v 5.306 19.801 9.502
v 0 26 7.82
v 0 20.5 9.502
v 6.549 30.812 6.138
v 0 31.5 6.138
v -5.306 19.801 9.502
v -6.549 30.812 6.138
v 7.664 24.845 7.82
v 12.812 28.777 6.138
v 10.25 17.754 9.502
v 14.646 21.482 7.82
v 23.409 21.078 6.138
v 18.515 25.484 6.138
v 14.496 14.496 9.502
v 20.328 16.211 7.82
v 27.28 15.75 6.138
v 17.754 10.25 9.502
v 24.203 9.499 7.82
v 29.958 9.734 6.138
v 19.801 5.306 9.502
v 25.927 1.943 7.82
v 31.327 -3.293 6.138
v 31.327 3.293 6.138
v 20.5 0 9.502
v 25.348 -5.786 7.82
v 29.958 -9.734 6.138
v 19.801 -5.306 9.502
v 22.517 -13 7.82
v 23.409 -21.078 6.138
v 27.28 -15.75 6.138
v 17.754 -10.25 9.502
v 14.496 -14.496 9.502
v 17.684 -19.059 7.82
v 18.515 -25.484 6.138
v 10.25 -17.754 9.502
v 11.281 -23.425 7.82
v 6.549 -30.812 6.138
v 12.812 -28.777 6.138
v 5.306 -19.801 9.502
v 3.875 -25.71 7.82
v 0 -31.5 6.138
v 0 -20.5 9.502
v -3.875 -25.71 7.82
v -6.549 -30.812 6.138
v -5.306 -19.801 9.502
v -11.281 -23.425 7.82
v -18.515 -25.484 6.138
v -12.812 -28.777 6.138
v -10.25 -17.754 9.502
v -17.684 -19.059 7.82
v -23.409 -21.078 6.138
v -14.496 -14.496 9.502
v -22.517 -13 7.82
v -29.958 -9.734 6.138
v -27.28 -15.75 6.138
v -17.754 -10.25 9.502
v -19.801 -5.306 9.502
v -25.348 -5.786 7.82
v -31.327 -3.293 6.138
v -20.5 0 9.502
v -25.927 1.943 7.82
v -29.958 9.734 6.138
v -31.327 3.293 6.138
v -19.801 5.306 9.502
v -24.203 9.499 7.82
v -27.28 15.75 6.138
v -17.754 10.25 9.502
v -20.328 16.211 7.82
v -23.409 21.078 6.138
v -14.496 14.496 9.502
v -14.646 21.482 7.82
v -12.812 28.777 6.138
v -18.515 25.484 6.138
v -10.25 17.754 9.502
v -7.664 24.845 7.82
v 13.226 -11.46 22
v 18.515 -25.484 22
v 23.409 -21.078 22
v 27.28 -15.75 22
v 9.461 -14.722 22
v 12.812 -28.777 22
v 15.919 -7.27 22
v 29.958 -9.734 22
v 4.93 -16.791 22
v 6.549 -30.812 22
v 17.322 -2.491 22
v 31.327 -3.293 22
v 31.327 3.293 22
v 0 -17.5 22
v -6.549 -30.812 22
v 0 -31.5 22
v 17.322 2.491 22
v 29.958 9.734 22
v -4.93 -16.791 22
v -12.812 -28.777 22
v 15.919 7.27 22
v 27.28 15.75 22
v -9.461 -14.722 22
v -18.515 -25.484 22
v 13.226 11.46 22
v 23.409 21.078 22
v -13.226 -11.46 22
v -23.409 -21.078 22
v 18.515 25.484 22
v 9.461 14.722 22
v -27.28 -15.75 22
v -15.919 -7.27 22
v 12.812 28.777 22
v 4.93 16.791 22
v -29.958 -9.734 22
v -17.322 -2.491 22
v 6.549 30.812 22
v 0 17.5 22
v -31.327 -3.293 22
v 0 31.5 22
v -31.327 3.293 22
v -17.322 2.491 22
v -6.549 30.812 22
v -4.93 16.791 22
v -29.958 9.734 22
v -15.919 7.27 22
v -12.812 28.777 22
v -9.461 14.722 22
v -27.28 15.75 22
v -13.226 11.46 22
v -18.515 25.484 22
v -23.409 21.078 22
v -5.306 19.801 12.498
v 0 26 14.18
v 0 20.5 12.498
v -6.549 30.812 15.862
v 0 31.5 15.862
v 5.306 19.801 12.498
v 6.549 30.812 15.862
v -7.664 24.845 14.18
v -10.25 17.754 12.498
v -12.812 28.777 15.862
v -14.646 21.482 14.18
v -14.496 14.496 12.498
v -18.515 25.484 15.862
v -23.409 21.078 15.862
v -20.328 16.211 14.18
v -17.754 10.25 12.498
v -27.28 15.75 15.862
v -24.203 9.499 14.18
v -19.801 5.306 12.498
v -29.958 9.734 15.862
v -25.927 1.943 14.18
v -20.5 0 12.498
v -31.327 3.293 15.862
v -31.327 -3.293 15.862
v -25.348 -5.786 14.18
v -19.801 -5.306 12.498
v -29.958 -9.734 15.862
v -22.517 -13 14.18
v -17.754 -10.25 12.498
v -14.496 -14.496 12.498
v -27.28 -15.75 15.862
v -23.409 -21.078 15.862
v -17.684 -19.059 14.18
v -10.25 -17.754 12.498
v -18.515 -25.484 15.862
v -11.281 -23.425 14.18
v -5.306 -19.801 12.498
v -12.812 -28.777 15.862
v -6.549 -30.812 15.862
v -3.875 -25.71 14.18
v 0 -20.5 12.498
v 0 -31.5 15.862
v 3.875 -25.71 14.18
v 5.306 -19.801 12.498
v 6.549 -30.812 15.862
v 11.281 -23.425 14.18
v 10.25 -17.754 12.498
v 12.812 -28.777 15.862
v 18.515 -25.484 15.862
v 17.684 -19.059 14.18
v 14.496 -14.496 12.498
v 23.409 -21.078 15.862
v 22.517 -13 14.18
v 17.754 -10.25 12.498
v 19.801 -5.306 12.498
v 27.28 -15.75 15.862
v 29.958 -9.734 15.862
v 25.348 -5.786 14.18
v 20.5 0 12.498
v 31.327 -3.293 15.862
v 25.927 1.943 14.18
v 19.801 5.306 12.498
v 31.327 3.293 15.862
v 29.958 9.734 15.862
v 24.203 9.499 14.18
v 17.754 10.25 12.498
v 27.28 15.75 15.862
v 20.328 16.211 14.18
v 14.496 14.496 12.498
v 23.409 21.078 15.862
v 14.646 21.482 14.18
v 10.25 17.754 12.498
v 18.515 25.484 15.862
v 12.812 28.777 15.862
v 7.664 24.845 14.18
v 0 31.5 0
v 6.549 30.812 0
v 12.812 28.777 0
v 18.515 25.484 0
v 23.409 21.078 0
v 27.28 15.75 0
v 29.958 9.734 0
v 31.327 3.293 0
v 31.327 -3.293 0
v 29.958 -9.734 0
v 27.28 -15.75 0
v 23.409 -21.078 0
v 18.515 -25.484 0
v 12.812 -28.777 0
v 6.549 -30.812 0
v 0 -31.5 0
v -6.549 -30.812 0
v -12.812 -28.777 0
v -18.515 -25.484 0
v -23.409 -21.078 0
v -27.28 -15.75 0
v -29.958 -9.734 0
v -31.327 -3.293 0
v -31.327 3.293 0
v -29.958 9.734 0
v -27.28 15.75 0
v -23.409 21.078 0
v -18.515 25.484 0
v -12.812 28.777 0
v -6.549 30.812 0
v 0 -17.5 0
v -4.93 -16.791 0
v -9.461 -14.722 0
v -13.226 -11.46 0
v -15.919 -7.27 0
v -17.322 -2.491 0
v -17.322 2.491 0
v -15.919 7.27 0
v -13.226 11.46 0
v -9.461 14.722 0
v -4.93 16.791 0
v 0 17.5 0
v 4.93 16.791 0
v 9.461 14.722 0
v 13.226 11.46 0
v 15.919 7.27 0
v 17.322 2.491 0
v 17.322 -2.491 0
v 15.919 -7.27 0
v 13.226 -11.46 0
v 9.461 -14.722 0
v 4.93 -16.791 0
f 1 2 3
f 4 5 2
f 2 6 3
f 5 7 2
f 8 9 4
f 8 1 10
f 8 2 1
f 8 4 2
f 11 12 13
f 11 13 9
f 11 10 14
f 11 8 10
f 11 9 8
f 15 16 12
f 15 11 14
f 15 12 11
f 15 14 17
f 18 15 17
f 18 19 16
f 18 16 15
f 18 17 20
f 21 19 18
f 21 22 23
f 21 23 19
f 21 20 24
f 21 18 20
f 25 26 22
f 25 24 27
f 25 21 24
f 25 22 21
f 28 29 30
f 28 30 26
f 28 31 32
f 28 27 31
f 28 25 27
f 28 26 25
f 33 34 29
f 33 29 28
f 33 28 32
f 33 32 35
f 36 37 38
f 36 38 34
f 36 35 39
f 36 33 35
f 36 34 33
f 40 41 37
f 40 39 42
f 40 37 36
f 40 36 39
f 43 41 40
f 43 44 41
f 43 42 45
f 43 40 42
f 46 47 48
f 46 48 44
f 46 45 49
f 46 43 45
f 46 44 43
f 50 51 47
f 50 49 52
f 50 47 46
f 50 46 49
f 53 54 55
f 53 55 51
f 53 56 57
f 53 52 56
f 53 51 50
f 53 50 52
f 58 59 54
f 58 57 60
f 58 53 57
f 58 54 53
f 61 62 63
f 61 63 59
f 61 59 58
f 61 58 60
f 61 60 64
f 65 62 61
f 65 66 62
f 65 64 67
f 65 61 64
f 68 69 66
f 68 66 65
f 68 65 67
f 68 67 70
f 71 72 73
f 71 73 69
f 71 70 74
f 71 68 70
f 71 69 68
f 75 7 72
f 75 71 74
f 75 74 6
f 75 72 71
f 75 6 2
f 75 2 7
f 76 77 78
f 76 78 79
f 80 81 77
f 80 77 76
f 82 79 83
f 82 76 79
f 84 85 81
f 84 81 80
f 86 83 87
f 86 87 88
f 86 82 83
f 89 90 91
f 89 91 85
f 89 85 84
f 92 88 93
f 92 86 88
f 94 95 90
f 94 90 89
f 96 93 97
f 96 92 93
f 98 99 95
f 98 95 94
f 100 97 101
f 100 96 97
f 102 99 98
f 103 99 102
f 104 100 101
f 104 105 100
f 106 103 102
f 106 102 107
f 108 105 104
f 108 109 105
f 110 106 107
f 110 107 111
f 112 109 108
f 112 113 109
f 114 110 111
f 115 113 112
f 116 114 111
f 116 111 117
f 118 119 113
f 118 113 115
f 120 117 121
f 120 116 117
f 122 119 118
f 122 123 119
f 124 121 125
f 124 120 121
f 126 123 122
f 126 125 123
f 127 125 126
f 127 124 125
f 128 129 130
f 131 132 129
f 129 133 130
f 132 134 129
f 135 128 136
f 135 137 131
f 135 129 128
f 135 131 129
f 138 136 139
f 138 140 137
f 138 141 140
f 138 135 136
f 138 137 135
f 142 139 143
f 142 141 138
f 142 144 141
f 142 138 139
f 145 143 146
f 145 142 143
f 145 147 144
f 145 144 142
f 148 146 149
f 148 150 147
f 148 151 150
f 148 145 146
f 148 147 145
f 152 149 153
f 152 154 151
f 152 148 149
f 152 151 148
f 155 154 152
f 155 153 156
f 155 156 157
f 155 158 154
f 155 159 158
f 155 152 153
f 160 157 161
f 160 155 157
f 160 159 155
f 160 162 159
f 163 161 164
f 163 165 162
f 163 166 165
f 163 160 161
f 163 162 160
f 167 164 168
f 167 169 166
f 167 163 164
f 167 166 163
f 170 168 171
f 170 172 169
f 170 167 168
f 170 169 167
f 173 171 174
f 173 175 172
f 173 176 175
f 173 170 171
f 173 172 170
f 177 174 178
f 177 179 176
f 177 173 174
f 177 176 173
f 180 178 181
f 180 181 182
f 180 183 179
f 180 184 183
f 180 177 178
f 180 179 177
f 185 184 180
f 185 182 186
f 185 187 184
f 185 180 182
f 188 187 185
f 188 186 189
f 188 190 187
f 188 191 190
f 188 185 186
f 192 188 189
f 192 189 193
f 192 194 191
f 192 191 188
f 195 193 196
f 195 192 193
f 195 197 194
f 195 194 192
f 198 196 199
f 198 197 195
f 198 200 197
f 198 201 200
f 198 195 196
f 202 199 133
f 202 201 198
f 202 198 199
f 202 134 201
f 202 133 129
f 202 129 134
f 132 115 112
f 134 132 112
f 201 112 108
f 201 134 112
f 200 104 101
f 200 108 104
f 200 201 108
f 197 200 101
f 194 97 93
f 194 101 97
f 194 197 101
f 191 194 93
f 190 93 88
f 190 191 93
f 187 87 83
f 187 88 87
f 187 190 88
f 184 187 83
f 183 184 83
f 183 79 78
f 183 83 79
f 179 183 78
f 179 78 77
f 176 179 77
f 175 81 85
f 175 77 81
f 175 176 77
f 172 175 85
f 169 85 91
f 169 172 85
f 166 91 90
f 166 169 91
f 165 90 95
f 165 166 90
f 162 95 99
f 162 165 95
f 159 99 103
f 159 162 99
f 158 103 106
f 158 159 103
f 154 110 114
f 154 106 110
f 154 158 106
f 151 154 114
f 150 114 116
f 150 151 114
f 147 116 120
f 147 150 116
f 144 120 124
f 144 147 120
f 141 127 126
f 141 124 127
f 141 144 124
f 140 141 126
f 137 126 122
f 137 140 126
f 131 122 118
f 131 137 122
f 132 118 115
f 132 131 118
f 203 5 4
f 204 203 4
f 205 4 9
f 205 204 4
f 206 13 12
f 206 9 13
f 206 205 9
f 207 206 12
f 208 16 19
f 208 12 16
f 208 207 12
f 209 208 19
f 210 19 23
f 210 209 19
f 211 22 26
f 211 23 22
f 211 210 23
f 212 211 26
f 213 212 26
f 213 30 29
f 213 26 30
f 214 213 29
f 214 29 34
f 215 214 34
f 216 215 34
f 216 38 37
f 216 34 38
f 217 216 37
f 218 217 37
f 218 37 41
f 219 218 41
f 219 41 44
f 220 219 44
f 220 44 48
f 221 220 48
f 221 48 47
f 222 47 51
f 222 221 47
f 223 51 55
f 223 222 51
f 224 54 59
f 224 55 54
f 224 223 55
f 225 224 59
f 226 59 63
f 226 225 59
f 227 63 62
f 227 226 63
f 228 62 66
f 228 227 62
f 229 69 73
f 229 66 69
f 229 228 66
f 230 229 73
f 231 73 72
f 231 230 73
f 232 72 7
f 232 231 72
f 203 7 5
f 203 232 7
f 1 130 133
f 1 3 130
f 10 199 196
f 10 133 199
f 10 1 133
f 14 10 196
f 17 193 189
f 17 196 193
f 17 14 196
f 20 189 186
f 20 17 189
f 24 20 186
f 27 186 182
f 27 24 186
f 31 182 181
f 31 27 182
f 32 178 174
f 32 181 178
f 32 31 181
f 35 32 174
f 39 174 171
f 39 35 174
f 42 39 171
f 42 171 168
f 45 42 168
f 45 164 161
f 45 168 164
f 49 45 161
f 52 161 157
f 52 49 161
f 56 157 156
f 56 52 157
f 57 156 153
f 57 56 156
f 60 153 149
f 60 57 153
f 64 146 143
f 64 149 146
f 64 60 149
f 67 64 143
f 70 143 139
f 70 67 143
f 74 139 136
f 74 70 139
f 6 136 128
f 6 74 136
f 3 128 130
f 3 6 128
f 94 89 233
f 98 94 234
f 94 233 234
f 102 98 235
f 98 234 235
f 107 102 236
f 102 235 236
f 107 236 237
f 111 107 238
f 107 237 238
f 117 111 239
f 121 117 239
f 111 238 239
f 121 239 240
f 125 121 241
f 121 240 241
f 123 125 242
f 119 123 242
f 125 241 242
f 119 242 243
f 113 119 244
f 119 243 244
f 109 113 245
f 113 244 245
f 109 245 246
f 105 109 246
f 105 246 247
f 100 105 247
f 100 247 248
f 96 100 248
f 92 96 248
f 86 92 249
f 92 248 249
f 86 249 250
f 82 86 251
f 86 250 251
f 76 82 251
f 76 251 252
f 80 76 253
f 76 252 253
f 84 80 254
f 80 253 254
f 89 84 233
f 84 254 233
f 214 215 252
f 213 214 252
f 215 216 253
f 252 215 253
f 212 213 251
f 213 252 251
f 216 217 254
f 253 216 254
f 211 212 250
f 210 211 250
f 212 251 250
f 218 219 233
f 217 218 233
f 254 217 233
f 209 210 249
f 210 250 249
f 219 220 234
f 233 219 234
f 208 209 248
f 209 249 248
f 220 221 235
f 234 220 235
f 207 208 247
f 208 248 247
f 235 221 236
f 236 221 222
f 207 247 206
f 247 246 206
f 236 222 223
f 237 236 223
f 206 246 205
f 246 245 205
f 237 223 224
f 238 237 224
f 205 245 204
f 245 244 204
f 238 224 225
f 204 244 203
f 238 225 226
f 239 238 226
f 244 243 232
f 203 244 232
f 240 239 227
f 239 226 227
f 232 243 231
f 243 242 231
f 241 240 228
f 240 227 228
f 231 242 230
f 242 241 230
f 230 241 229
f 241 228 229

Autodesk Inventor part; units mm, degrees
ref_plane "YZ Plane" through (0, 0, 0) normal (1, 0, 0) x (0, 1, 0)
ref_plane "XZ Plane" through (0, 0, 0) normal (0, 1, 0) x (-1, 0, 0)
sketch "Esquisse principale" plane through (0, 0, 0) normal (1, 0, 0) x (0, 1, 0)
  line L0 (0, 22) -> (31.5, 22)
  line L1 (31.5, 22) -> (31.5, 15.8615)
  line L2 (31.5, 15.8615) -> (20.5, 12.4984)
  line L3 (20.5, 12.4984) -> (20.5, 9.5016)
  line L4 (20.5, 9.5016) -> (31.5, 6.1385)
  line L5 (31.5, 6.1385) -> (31.5, 0)
  line L6 (31.5, 0) -> (0, 0)
  line L7 (29.5, 15.25) -> (29.5, 6.75) construction
  line L8 (20.5, 11) -> (29.5, 11) construction
  line L9 (31.5, 15.8615) -> (31.5, 6.1385)
  line L10 (0, -3.2) -> (0, 19.2) projected
  line L11 (0, 0) -> (0, 22)
  dimension "d0" = 8.5
  dimension "d1" = 34
  dimension "d2" = 2
  dimension "d6" = 22
  dimension "d21" = 59
  dimension "d25" = 11
  dimension "d27" = 11
ref_plane "Plan de courroie" through (0, 20.5, 11) normal (0, 0, 1) x (1, 0, 0)
revolve "Corps" add sketch "Esquisse principale" angle 360 about axis through (0, 0, -10) along (0, 0, 1)
revolve "Bord" cut sketch "Esquisse principale" angle 360 about axis through (0, 0, -10) along (0, 0, 1) contours L9 L4 L3 L2
fillet "Congé externe" [suppressed]
fillet "Congé interne" [suppressed]
pattern_of_one "Réseau de bords"
sketch "Esquisse2" plane through (0, 0, 22) normal (0, 0, 1) x (1, 0, 0)
  circle A0 centre (0, 0) radius 31.5 projected
hole "Perçage1" at (0, 0, 22) direction (0, 0, -1) diameter 35 depth 22
equation "\"d0\" = da_Bw"
equation "\"d1\" = da_Alfa"
equation "\"d2\" = da_c"
equation "\"d21\" = da_Dw"
equation "\"d25\" = da_Hd"
equation "\"d27\" = da_Se"
equation "\"da_r1\" = 0"
equation "\"da_r2\" = 0"
equation "\"d18\" = da_Sg"
equation "\"d5\" = da_Se"
equation "\"da_Bw\" = 8.5"
equation "\"da_Alfa\" = 34deg"
equation "\"da_c\" = 2"
equation "\"da_Dw\" = 59"
equation "\"da_Hd\" = 11"
equation "\"da_Se\" = 11"
equation "\"da_Sg\" = 12"
properties part number "Poulie à gorge2" material "Steel"
